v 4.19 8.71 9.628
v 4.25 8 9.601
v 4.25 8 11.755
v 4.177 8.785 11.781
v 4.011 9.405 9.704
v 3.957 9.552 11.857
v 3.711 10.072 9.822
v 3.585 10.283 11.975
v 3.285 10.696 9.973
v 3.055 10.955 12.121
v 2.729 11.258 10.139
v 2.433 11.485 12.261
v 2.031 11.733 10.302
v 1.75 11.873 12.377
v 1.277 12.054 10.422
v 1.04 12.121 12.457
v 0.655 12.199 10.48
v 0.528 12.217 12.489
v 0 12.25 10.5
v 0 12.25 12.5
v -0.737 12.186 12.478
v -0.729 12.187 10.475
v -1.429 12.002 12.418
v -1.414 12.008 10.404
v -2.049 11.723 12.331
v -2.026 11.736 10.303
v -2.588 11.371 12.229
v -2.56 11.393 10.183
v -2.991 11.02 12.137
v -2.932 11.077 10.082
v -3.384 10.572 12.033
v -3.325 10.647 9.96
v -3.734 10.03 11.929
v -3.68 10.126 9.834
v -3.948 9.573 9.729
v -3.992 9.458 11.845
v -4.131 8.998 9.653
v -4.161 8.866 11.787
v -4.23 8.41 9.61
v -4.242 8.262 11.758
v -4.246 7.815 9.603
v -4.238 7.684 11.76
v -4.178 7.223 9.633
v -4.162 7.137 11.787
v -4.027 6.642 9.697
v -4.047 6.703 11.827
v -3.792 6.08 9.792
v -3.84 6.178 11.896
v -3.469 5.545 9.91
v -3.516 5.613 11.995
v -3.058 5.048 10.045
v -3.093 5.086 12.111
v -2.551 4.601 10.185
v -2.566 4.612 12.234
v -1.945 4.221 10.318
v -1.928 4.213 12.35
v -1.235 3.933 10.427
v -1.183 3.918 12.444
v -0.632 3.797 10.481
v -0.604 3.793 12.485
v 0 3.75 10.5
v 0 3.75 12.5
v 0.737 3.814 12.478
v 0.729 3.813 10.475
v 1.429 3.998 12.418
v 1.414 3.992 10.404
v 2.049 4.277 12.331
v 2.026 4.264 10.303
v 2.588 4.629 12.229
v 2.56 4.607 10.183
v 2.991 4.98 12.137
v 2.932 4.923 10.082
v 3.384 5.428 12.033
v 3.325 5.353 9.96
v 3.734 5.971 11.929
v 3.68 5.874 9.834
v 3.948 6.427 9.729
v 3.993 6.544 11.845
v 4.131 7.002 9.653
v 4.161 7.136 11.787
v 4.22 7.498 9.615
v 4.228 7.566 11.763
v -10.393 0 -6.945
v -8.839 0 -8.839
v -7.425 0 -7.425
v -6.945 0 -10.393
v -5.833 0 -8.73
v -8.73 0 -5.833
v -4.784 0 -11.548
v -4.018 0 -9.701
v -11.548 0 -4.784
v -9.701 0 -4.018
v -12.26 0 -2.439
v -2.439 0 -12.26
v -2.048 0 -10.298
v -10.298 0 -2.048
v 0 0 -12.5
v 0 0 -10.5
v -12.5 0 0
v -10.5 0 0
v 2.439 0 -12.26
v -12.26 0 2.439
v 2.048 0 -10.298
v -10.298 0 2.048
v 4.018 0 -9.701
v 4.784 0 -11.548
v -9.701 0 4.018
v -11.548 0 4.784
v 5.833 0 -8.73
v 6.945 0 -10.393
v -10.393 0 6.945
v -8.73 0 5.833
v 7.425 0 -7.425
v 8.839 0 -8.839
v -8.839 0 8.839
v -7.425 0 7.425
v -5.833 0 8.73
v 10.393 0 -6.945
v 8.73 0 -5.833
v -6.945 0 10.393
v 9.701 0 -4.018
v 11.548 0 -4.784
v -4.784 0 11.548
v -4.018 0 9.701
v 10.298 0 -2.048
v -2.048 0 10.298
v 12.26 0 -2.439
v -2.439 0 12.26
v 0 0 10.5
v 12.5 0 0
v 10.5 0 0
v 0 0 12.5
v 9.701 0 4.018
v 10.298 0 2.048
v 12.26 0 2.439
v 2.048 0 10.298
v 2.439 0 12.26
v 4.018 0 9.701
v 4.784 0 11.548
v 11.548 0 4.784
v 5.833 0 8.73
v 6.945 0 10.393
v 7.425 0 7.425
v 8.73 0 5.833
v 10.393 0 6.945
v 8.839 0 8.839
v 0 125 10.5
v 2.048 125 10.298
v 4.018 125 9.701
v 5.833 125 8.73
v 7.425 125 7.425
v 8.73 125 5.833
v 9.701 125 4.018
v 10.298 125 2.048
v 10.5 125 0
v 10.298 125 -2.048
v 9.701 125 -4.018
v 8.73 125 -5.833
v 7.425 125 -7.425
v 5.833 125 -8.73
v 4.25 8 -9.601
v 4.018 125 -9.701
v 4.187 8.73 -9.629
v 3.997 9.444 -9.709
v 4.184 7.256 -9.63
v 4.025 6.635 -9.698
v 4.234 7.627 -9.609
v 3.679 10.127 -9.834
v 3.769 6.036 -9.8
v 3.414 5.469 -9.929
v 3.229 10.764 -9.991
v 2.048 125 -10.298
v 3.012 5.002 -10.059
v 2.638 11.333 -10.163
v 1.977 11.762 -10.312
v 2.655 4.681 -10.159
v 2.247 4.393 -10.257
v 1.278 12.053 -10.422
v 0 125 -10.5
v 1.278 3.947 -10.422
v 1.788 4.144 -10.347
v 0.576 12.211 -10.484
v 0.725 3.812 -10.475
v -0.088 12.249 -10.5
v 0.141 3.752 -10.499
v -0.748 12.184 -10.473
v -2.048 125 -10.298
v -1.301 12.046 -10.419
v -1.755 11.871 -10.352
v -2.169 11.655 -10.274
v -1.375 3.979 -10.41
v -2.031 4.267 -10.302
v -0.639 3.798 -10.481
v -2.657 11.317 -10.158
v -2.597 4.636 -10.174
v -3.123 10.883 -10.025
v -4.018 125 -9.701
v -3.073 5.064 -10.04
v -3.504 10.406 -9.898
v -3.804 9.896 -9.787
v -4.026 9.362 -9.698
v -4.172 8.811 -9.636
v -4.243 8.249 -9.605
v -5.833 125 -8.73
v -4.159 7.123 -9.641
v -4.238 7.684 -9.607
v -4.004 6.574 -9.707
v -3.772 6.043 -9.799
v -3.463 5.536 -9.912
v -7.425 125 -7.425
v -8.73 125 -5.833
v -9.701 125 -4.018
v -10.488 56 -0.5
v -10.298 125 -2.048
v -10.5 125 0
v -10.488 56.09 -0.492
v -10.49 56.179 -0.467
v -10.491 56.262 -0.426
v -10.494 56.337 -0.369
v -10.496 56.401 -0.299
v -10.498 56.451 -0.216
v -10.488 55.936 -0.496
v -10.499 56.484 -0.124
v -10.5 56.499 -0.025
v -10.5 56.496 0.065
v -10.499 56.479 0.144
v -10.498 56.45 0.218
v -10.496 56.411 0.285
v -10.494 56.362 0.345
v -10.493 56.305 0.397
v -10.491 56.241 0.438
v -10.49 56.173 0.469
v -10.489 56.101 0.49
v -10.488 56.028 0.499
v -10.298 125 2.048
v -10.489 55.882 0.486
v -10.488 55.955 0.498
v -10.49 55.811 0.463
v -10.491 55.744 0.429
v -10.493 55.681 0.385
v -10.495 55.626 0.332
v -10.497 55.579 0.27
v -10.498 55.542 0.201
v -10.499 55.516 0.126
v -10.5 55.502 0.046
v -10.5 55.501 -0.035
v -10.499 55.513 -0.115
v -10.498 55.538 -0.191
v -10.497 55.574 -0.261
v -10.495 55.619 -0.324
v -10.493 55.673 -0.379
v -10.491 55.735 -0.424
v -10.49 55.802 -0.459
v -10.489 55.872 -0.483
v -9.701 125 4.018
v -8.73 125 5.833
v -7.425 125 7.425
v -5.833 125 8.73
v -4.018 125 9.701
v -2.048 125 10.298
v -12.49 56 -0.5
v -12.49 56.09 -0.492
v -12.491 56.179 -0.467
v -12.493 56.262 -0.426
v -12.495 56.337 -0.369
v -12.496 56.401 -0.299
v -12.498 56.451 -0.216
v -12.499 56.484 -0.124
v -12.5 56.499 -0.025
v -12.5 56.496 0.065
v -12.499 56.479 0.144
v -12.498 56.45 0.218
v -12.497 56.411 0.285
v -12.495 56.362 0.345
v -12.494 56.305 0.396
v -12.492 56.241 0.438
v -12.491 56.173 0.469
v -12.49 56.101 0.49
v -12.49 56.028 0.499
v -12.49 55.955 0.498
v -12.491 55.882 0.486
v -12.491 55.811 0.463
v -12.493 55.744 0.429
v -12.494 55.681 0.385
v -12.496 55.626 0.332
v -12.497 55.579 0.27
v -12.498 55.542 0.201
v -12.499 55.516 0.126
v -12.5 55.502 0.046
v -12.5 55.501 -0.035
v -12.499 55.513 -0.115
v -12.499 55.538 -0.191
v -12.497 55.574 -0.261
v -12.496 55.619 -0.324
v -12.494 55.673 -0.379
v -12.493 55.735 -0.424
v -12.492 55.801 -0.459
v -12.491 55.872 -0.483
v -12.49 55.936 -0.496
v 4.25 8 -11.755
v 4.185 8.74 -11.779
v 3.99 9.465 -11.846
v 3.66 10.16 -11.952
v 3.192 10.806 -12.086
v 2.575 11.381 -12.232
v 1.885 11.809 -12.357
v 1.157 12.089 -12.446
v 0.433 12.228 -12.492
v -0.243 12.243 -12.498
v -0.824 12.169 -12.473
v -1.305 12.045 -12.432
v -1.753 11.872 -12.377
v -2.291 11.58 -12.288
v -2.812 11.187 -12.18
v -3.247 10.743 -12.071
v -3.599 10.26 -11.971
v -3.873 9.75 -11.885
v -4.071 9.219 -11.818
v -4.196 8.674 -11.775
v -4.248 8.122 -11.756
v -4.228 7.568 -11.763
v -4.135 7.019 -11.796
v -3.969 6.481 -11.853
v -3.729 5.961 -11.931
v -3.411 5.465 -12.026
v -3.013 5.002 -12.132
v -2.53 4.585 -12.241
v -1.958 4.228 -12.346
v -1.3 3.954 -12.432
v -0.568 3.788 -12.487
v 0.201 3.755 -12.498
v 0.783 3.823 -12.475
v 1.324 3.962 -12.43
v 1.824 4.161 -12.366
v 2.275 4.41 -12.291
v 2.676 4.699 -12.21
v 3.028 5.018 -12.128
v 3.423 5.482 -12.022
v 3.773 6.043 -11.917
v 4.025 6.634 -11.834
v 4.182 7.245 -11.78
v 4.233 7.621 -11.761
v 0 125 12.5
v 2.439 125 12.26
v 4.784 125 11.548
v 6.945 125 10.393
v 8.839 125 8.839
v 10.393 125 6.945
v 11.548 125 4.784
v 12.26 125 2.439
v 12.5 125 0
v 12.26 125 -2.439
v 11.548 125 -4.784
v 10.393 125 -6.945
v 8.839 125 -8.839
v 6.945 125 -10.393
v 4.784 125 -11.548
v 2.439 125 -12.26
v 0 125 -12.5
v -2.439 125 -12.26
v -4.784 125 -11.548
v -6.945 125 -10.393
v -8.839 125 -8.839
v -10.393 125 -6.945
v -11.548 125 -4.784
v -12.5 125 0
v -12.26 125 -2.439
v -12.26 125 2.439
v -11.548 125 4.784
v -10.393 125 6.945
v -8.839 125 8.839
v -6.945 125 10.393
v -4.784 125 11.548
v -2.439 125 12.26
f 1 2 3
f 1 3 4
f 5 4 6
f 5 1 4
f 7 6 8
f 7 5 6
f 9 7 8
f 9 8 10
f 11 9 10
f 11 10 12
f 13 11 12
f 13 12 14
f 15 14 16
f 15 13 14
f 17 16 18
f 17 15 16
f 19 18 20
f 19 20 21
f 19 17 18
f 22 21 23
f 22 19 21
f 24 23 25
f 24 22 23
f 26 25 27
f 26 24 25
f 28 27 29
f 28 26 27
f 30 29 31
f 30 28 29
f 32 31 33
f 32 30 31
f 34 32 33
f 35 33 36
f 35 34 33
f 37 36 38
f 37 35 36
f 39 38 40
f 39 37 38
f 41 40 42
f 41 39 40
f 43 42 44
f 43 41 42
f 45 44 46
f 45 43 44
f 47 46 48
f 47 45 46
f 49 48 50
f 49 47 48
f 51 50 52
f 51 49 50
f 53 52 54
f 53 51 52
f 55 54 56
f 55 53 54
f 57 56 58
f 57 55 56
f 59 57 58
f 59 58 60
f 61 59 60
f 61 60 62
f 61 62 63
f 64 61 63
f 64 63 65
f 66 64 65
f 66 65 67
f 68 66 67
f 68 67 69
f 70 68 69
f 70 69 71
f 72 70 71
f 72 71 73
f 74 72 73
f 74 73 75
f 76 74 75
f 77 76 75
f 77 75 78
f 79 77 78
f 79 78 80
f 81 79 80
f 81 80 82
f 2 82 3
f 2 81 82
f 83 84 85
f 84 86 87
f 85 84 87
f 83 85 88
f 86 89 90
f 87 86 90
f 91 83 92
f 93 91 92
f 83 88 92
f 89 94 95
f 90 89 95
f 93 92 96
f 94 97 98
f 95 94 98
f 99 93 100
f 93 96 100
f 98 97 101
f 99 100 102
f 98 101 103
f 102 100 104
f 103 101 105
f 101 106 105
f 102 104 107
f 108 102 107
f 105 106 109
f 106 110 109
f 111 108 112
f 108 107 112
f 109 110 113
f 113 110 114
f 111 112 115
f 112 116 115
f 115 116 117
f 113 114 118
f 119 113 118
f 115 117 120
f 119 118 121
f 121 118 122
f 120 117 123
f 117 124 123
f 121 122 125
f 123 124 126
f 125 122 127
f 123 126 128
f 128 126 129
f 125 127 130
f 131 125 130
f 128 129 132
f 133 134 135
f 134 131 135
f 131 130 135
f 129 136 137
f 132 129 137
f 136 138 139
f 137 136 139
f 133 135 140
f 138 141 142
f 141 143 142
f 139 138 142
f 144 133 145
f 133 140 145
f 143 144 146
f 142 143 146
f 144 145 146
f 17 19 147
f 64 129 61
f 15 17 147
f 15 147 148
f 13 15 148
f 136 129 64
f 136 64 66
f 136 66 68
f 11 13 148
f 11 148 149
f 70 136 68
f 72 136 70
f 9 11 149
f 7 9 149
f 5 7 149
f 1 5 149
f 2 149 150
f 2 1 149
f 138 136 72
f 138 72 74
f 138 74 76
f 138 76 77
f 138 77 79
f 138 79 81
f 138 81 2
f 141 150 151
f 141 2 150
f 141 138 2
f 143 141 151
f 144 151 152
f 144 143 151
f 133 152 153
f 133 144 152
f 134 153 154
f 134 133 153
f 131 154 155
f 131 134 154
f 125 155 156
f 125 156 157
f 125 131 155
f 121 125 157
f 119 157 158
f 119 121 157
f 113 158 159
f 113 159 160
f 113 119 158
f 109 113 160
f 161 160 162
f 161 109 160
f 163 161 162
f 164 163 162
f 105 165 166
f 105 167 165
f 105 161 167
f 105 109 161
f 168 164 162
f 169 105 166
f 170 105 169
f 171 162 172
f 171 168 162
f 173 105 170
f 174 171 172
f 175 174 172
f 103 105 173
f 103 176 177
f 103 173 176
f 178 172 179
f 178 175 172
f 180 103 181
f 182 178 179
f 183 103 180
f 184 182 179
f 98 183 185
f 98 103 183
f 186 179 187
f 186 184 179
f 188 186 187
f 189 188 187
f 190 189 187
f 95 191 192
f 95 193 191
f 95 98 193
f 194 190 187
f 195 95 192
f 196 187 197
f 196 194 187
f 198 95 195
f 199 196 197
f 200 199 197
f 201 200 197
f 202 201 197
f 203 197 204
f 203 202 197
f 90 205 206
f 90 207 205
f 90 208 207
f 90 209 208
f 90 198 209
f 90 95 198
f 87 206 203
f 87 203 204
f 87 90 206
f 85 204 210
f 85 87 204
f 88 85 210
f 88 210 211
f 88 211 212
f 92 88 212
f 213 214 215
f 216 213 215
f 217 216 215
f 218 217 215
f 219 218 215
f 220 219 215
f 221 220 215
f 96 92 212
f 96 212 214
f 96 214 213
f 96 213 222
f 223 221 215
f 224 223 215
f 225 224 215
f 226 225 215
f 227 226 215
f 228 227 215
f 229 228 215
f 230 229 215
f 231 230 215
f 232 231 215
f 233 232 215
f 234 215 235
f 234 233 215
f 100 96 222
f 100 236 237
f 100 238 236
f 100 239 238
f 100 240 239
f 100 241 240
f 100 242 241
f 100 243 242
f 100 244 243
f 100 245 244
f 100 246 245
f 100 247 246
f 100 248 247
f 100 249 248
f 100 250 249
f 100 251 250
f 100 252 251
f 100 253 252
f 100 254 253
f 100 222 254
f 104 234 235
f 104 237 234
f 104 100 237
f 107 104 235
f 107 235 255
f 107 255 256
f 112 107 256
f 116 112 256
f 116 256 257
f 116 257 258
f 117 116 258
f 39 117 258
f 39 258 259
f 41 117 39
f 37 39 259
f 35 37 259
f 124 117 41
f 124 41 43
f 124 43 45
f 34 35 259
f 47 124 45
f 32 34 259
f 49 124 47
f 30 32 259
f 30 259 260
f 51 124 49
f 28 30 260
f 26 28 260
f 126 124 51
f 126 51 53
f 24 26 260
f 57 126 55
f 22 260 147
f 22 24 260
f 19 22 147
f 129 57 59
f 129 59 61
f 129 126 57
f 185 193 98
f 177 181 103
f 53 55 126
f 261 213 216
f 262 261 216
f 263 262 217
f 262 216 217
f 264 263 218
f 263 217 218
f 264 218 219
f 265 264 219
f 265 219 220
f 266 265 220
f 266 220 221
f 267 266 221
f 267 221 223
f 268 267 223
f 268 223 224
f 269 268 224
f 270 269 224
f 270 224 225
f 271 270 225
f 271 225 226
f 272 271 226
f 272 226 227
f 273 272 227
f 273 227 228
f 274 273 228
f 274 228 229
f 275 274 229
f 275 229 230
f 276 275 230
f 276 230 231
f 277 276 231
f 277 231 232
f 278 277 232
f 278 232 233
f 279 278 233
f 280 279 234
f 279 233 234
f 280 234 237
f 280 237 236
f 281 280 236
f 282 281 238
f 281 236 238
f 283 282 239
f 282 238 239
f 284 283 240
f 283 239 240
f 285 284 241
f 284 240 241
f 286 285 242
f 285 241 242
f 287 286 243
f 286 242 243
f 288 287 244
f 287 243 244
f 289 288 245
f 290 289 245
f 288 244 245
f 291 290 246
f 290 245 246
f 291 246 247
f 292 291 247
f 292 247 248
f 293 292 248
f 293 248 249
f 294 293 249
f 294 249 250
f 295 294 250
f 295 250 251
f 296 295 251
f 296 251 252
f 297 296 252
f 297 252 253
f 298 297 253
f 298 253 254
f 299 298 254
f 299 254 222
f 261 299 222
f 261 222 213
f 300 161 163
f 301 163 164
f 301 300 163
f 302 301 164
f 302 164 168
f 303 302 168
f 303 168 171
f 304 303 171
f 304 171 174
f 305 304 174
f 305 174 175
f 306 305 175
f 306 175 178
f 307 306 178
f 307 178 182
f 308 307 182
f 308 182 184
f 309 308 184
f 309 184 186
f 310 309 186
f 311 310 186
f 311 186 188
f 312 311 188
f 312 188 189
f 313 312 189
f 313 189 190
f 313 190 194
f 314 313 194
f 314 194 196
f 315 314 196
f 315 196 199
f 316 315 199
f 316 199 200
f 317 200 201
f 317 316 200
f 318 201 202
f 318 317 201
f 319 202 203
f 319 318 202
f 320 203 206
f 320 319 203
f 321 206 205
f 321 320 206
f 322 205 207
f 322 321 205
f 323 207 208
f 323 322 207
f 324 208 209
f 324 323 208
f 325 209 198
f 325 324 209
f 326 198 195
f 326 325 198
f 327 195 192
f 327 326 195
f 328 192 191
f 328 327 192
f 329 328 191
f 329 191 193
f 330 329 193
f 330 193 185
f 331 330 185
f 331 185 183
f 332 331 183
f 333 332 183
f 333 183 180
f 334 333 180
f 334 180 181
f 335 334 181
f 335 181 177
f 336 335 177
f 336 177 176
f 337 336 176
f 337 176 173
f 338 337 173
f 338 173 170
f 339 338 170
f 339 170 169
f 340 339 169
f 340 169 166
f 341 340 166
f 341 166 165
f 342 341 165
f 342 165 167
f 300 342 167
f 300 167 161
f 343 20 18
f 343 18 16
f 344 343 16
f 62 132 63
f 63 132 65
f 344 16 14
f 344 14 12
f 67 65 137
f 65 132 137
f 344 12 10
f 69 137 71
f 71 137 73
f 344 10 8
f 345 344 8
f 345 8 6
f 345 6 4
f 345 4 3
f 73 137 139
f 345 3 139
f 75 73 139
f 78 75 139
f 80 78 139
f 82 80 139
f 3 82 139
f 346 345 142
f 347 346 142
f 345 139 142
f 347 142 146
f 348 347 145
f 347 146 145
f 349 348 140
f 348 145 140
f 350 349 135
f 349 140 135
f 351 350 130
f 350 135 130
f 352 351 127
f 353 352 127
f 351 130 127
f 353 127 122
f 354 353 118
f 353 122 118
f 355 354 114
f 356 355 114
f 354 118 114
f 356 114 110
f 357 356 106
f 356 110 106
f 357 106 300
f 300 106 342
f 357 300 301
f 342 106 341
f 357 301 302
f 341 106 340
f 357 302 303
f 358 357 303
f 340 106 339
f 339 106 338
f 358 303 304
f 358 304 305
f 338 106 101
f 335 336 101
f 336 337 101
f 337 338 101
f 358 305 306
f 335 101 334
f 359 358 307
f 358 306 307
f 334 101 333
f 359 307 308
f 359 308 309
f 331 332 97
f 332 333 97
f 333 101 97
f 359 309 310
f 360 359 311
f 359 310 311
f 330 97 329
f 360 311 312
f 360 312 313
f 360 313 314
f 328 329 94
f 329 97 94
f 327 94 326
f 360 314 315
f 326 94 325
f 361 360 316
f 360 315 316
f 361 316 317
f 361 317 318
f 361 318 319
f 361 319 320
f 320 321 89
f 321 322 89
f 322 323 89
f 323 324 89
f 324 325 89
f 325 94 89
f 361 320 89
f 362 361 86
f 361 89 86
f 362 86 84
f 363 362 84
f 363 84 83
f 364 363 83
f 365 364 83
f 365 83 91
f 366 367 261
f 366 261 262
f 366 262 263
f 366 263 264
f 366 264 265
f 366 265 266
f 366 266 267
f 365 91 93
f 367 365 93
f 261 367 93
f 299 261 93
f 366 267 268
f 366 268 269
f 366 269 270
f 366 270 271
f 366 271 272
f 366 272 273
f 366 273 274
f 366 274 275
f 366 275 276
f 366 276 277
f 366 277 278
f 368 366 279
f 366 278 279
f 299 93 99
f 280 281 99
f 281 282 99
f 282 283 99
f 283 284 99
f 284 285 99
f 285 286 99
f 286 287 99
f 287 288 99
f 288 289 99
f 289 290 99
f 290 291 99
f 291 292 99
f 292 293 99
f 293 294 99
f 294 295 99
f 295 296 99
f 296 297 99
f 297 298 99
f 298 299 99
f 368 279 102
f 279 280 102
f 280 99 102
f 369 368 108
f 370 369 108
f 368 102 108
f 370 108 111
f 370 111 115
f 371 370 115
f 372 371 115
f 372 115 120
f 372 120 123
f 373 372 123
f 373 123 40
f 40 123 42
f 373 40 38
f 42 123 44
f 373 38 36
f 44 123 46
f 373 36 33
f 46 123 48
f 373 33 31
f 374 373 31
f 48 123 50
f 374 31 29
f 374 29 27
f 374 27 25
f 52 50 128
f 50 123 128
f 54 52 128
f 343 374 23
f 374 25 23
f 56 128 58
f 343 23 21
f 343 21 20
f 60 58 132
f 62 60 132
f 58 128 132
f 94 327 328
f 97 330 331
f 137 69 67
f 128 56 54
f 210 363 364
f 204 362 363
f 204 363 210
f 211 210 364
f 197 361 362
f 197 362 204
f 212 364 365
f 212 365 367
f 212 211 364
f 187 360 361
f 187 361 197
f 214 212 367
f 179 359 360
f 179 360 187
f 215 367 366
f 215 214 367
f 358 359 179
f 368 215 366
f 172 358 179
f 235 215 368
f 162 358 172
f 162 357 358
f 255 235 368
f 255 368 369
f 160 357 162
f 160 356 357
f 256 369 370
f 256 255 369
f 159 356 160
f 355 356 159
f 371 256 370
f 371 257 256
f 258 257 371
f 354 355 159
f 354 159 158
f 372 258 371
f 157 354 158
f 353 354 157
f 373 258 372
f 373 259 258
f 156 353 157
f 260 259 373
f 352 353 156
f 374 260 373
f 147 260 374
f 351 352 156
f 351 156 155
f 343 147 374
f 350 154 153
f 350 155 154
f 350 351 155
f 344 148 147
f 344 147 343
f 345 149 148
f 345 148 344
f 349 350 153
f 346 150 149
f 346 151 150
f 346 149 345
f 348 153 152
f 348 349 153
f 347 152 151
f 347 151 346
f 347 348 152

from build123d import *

# Parameters (mm, degrees)
SKETCH_1_R               = 12.5
SKETCH_1_R_2             = 10.5
EXTRUDE_1_DEPTH          = 125
CUT_EXTRUDE_1_DEPTH      = 127.24381173
CUT_EXTRUDE_1_DEPTH_BACK = 127.24381173
SKETCH_2_R               = 4.25
SKETCH_4_R               = 0.5
CUT_EXTRUDE_3_DEPTH      = 25


with BuildPart() as part:
    # Эскиз1 → Бобышка-Вытянуть1 (new body)
    with BuildSketch(Plane(origin=(0, 0, 0), x_dir=(1, 0, 0), z_dir=(0, 1, 0))):
        with Locations(Location((0, 0, 0), (0, 0, 270))):
            Circle(SKETCH_1_R)
        with Locations(Location((0, 0, 0), (0, 0, 270))):
            Circle(SKETCH_1_R_2, mode=Mode.SUBTRACT)
    extrude(amount=EXTRUDE_1_DEPTH)

    # Эскиз2 → Вырез-Вытянуть1 (cut, two sides: drawn at the far end of the back side and taken through both)
    with BuildSketch(Plane.XY.offset(-CUT_EXTRUDE_1_DEPTH_BACK)):
        with Locations((0, 8)):
            Circle(SKETCH_2_R)
    extrude(amount=CUT_EXTRUDE_1_DEPTH + CUT_EXTRUDE_1_DEPTH_BACK, mode=Mode.SUBTRACT)

    # Эскиз4 → Вырез-Вытянуть3 (cut)
    with BuildSketch(Plane(origin=(0, 0, 0), x_dir=(0, 0, -1), z_dir=(1, 0, 0))):
        with Locations((0, 56)):
            Circle(SKETCH_4_R)
    extrude(amount=-CUT_EXTRUDE_3_DEPTH, mode=Mode.SUBTRACT)


solid = part.part
